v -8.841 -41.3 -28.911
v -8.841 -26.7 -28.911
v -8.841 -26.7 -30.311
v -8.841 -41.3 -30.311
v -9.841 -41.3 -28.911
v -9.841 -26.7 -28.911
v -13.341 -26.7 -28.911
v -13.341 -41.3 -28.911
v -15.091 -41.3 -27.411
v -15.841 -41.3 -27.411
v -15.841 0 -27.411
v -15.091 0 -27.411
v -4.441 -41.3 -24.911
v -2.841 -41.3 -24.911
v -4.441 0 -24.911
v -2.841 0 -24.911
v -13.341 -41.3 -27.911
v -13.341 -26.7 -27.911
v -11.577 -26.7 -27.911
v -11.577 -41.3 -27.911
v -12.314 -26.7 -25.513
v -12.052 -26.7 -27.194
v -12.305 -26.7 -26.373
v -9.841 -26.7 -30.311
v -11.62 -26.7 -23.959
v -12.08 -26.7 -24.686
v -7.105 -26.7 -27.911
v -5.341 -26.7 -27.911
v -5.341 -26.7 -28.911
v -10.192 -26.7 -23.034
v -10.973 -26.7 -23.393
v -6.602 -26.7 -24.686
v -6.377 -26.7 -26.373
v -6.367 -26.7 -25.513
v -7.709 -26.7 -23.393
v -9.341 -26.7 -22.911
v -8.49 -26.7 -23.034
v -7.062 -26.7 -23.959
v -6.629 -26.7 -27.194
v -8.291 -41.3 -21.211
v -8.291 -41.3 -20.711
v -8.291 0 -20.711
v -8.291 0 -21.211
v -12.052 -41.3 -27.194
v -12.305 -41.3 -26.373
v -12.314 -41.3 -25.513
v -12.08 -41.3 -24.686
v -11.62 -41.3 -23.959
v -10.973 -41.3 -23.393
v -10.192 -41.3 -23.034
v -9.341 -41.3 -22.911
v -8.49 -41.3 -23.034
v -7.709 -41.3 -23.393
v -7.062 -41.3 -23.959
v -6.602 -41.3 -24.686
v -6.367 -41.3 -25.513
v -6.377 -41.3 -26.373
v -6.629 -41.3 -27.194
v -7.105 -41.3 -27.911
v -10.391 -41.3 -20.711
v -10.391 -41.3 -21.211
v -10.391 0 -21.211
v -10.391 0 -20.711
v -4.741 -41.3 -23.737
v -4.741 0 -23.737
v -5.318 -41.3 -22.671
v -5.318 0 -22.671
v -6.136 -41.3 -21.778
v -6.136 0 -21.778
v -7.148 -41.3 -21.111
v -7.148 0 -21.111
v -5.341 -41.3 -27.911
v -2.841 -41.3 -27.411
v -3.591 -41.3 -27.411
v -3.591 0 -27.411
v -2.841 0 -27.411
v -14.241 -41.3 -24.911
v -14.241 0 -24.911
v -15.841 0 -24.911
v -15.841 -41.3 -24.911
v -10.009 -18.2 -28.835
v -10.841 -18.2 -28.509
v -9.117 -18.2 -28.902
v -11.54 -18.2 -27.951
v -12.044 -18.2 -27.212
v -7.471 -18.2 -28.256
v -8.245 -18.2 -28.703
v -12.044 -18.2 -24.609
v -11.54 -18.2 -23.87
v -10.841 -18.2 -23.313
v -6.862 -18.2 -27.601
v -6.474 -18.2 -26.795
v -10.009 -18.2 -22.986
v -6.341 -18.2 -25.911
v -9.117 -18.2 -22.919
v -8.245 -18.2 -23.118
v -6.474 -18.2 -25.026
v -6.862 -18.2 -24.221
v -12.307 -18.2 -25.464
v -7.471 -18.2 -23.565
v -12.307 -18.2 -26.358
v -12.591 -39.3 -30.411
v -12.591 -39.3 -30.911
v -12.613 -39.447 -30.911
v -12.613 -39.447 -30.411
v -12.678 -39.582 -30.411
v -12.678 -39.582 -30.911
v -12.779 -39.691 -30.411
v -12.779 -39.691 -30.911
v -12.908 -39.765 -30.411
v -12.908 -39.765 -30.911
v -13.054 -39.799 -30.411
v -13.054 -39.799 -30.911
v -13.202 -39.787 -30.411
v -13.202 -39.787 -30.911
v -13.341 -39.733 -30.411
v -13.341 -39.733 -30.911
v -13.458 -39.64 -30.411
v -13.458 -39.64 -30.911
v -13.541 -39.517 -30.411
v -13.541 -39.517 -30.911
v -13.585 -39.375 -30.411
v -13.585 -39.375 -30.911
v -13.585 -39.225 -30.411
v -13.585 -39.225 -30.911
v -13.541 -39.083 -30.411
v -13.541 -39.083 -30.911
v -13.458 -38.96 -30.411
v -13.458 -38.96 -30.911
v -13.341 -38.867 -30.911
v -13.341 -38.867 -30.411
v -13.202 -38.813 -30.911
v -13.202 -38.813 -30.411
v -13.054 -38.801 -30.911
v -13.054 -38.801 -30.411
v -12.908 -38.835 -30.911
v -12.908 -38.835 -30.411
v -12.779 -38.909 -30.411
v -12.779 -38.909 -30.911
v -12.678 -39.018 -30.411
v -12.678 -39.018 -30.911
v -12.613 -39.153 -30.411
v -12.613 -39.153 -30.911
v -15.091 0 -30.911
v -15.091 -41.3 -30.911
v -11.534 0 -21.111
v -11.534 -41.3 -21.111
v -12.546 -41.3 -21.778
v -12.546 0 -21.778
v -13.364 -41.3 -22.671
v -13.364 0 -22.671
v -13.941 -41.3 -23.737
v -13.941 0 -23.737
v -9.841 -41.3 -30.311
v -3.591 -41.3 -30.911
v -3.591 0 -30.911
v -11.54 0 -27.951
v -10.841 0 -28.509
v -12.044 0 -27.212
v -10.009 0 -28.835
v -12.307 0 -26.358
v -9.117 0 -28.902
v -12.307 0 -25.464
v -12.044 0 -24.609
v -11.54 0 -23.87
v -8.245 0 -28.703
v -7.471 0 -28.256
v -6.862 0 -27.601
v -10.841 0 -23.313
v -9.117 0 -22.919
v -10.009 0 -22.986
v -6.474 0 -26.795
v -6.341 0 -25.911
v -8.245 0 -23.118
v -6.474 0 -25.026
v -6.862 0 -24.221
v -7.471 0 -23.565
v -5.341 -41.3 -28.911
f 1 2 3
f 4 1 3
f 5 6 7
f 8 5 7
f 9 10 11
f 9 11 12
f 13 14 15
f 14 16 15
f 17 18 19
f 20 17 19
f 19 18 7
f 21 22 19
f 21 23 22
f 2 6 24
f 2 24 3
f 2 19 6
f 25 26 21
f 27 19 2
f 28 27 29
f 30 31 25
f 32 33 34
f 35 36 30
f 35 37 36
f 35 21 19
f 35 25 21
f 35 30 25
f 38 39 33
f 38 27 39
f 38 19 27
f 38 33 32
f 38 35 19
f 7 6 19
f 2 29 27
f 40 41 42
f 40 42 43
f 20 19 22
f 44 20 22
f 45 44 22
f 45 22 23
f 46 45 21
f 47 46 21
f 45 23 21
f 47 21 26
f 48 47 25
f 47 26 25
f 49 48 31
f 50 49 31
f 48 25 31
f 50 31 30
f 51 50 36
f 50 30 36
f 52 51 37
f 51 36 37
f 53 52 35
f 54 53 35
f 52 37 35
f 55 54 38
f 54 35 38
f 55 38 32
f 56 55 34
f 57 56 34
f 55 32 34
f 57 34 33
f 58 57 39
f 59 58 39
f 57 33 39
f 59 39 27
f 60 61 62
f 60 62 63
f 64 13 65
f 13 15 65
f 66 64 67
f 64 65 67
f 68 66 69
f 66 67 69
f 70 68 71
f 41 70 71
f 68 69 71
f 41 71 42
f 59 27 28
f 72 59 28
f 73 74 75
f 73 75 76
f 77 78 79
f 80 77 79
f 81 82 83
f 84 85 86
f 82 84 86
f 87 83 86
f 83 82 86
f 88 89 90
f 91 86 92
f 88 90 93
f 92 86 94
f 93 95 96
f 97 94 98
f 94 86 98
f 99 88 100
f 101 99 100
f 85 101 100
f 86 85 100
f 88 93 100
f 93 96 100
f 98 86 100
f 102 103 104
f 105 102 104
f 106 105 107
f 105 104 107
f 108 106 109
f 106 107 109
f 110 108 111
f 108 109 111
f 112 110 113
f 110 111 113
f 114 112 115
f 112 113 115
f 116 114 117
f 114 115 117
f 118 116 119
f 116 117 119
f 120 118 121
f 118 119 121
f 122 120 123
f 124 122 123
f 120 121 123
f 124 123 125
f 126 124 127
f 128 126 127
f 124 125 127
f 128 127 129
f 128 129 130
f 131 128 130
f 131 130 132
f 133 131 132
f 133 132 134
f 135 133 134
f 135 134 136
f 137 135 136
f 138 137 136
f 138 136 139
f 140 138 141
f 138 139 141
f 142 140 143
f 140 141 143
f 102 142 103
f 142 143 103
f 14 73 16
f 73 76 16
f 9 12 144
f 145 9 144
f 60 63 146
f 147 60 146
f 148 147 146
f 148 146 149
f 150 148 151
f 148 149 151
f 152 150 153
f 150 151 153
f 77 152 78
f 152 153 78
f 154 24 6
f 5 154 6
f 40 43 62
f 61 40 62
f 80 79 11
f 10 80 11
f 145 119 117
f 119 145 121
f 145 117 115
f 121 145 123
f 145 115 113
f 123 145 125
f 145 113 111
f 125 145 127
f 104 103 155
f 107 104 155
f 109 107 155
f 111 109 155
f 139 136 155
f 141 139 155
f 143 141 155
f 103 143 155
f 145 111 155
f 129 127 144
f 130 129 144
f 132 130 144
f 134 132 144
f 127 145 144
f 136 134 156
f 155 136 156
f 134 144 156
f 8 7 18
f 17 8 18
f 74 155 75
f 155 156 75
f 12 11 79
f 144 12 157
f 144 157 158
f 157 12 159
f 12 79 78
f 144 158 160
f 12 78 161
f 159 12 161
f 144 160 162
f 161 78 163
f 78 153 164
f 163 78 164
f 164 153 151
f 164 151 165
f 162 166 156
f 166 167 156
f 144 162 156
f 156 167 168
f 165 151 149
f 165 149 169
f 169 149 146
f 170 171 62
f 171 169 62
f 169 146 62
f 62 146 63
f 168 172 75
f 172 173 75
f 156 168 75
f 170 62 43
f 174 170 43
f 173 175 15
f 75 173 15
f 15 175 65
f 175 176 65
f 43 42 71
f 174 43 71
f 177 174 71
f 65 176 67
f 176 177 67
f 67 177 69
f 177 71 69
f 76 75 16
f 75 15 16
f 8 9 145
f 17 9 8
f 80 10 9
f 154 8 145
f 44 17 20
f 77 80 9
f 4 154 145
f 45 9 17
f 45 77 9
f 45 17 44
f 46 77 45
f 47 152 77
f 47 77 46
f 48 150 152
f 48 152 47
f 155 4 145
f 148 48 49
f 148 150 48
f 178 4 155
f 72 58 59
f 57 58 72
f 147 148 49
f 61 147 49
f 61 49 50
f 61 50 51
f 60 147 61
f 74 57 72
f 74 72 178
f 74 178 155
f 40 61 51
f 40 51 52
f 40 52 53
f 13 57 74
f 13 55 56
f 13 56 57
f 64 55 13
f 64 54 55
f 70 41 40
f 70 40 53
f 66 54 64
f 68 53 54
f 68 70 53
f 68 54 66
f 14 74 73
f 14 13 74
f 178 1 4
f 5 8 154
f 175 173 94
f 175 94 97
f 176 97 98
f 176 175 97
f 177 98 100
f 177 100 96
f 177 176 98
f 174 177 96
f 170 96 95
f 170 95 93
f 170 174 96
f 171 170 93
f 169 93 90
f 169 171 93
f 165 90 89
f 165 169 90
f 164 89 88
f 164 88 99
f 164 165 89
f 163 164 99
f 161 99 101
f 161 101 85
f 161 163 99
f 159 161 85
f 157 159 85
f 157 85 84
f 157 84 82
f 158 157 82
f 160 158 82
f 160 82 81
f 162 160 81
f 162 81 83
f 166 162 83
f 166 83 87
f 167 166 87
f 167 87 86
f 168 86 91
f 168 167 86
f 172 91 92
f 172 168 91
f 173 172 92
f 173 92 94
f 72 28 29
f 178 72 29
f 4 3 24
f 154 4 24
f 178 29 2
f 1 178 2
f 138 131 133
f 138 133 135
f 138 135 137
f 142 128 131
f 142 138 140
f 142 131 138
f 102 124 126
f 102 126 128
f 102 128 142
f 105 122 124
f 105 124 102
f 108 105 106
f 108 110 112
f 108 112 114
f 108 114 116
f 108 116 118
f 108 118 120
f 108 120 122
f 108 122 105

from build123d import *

# Parameters (mm, degrees)
F0_R     = 3
F1_DEPTH = 18.2
F3_DEPTH = 8.5
F5_DEPTH = 14.6
F6_R     = 0.5
F7_DEPTH = 0.5


with BuildPart() as f1:
    # F0 (on Front) → F1 (new body)
    with BuildSketch(Plane.XZ):
        with BuildLine():
            Line((-15.090977, -27.410671), (-15.090977, -30.910671))
            Line((-15.090977, -30.910671), (-3.590977, -30.910671))
            Line((-3.590977, -30.910671), (-3.590977, -27.410671))
            Line((-3.590977, -27.410671), (-2.840977, -27.410671))
            Line((-2.840977, -27.410671), (-2.840977, -24.910671))
            Line((-2.840977, -24.910671), (-3.590977, -24.910671))
            Line((-3.590977, -24.910671), (-4.440977, -24.910671))
            ThreePointArc((-4.440977, -24.910671), (-5.699463, -22.199699), (-8.290977, -20.710671))
            Line((-8.290977, -20.710671), (-8.290977, -21.210671))
            Line((-8.290977, -21.210671), (-10.390977, -21.210671))
            Line((-10.390977, -21.210671), (-10.390977, -20.710671))
            ThreePointArc((-10.390977, -20.710671), (-12.982492, -22.199699), (-14.240977, -24.910671))
            Line((-14.240977, -24.910671), (-15.090977, -24.910671))
            Line((-15.090977, -24.910671), (-15.840977, -24.910671))
            Line((-15.840977, -24.910671), (-15.840977, -27.410671))
            Line((-15.840977, -27.410671), (-15.090977, -27.410671))
        make_face()
        with Locations((-9.340977, -25.910671)):
            Circle(F0_R, mode=Mode.SUBTRACT)
    extrude(amount=F1_DEPTH)

    # F2 (on face) → F3 (join)
    with BuildSketch(Plane.XZ.offset(18.2)):
        with BuildLine():
            Line((-15.090977, -27.410671), (-15.090977, -30.910671))
            Line((-15.090977, -30.910671), (-3.590977, -30.910671))
            Line((-3.590977, -30.910671), (-3.590977, -27.410671))
            Line((-3.590977, -27.410671), (-2.840977, -27.410671))
            Line((-2.840977, -27.410671), (-2.840977, -24.910671))
            Line((-2.840977, -24.910671), (-3.590977, -24.910671))
            Line((-3.590977, -24.910671), (-4.440977, -24.910671))
            ThreePointArc((-4.440977, -24.910671), (-5.699463, -22.199699), (-8.290977, -20.710671))
            Line((-8.290977, -20.710671), (-8.290977, -21.210671))
            Line((-8.290977, -21.210671), (-10.390977, -21.210671))
            Line((-10.390977, -21.210671), (-10.390977, -20.710671))
            ThreePointArc((-10.390977, -20.710671), (-12.982492, -22.199699), (-14.240977, -24.910671))
            Line((-14.240977, -24.910671), (-15.090977, -24.910671))
            Line((-15.090977, -24.910671), (-15.840977, -24.910671))
            Line((-15.840977, -24.910671), (-15.840977, -27.410671))
            Line((-15.840977, -27.410671), (-15.090977, -27.410671))
        make_face()
    extrude(amount=F3_DEPTH)

    # F4 (on face) → F5 (join)
    with BuildSketch(Plane.XZ.offset(26.7)):
        with BuildLine():
            Line((-15.090977, -27.410671), (-15.090977, -30.910671))
            Line((-15.090977, -30.910671), (-3.590977, -30.910671))
            Line((-3.590977, -30.910671), (-3.590977, -27.410671))
            Line((-3.590977, -27.410671), (-2.840977, -27.410671))
            Line((-2.840977, -27.410671), (-2.840977, -24.910671))
            Line((-2.840977, -24.910671), (-3.590977, -24.910671))
            Line((-3.590977, -24.910671), (-4.440977, -24.910671))
            ThreePointArc((-4.440977, -24.910671), (-5.699463, -22.199699), (-8.290977, -20.710671))
            Line((-8.290977, -20.710671), (-8.290977, -21.210671))
            Line((-8.290977, -21.210671), (-10.390977, -21.210671))
            Line((-10.390977, -21.210671), (-10.390977, -20.710671))
            ThreePointArc((-10.390977, -20.710671), (-12.982492, -22.199699), (-14.240977, -24.910671))
            Line((-14.240977, -24.910671), (-15.090977, -24.910671))
            Line((-15.090977, -24.910671), (-15.840977, -24.910671))
            Line((-15.840977, -24.910671), (-15.840977, -27.410671))
            Line((-15.840977, -27.410671), (-15.090977, -27.410671))
        make_face()
        with BuildLine():
            ThreePointArc((-11.577045, -27.910671), (-9.340977, -22.910671), (-7.104909, -27.910671))
            Line((-7.104909, -27.910671), (-5.340977, -27.910671))
            Line((-5.340977, -27.910671), (-5.340977, -28.910671))
            Line((-5.340977, -28.910671), (-8.840977, -28.910671))
            Line((-8.840977, -28.910671), (-8.840977, -30.310671))
            Line((-8.840977, -30.310671), (-9.840977, -30.310671))
            Line((-9.840977, -30.310671), (-9.840977, -28.910671))
            Line((-9.840977, -28.910671), (-13.340977, -28.910671))
            Line((-13.340977, -28.910671), (-13.340977, -27.910671))
            Line((-13.340977, -27.910671), (-11.577045, -27.910671))
        make_face(mode=Mode.SUBTRACT)
    extrude(amount=F5_DEPTH)

    # F6 (on face) → F7 (cut)
    with BuildSketch(Plane(origin=(0, 0, -30.910671), x_dir=(1, 0, 0), z_dir=(0, 0, -1))):
        with Locations((-13.090977, 39.3)):
            Circle(F6_R)
    extrude(amount=-F7_DEPTH, mode=Mode.SUBTRACT)


solid = f1.part
